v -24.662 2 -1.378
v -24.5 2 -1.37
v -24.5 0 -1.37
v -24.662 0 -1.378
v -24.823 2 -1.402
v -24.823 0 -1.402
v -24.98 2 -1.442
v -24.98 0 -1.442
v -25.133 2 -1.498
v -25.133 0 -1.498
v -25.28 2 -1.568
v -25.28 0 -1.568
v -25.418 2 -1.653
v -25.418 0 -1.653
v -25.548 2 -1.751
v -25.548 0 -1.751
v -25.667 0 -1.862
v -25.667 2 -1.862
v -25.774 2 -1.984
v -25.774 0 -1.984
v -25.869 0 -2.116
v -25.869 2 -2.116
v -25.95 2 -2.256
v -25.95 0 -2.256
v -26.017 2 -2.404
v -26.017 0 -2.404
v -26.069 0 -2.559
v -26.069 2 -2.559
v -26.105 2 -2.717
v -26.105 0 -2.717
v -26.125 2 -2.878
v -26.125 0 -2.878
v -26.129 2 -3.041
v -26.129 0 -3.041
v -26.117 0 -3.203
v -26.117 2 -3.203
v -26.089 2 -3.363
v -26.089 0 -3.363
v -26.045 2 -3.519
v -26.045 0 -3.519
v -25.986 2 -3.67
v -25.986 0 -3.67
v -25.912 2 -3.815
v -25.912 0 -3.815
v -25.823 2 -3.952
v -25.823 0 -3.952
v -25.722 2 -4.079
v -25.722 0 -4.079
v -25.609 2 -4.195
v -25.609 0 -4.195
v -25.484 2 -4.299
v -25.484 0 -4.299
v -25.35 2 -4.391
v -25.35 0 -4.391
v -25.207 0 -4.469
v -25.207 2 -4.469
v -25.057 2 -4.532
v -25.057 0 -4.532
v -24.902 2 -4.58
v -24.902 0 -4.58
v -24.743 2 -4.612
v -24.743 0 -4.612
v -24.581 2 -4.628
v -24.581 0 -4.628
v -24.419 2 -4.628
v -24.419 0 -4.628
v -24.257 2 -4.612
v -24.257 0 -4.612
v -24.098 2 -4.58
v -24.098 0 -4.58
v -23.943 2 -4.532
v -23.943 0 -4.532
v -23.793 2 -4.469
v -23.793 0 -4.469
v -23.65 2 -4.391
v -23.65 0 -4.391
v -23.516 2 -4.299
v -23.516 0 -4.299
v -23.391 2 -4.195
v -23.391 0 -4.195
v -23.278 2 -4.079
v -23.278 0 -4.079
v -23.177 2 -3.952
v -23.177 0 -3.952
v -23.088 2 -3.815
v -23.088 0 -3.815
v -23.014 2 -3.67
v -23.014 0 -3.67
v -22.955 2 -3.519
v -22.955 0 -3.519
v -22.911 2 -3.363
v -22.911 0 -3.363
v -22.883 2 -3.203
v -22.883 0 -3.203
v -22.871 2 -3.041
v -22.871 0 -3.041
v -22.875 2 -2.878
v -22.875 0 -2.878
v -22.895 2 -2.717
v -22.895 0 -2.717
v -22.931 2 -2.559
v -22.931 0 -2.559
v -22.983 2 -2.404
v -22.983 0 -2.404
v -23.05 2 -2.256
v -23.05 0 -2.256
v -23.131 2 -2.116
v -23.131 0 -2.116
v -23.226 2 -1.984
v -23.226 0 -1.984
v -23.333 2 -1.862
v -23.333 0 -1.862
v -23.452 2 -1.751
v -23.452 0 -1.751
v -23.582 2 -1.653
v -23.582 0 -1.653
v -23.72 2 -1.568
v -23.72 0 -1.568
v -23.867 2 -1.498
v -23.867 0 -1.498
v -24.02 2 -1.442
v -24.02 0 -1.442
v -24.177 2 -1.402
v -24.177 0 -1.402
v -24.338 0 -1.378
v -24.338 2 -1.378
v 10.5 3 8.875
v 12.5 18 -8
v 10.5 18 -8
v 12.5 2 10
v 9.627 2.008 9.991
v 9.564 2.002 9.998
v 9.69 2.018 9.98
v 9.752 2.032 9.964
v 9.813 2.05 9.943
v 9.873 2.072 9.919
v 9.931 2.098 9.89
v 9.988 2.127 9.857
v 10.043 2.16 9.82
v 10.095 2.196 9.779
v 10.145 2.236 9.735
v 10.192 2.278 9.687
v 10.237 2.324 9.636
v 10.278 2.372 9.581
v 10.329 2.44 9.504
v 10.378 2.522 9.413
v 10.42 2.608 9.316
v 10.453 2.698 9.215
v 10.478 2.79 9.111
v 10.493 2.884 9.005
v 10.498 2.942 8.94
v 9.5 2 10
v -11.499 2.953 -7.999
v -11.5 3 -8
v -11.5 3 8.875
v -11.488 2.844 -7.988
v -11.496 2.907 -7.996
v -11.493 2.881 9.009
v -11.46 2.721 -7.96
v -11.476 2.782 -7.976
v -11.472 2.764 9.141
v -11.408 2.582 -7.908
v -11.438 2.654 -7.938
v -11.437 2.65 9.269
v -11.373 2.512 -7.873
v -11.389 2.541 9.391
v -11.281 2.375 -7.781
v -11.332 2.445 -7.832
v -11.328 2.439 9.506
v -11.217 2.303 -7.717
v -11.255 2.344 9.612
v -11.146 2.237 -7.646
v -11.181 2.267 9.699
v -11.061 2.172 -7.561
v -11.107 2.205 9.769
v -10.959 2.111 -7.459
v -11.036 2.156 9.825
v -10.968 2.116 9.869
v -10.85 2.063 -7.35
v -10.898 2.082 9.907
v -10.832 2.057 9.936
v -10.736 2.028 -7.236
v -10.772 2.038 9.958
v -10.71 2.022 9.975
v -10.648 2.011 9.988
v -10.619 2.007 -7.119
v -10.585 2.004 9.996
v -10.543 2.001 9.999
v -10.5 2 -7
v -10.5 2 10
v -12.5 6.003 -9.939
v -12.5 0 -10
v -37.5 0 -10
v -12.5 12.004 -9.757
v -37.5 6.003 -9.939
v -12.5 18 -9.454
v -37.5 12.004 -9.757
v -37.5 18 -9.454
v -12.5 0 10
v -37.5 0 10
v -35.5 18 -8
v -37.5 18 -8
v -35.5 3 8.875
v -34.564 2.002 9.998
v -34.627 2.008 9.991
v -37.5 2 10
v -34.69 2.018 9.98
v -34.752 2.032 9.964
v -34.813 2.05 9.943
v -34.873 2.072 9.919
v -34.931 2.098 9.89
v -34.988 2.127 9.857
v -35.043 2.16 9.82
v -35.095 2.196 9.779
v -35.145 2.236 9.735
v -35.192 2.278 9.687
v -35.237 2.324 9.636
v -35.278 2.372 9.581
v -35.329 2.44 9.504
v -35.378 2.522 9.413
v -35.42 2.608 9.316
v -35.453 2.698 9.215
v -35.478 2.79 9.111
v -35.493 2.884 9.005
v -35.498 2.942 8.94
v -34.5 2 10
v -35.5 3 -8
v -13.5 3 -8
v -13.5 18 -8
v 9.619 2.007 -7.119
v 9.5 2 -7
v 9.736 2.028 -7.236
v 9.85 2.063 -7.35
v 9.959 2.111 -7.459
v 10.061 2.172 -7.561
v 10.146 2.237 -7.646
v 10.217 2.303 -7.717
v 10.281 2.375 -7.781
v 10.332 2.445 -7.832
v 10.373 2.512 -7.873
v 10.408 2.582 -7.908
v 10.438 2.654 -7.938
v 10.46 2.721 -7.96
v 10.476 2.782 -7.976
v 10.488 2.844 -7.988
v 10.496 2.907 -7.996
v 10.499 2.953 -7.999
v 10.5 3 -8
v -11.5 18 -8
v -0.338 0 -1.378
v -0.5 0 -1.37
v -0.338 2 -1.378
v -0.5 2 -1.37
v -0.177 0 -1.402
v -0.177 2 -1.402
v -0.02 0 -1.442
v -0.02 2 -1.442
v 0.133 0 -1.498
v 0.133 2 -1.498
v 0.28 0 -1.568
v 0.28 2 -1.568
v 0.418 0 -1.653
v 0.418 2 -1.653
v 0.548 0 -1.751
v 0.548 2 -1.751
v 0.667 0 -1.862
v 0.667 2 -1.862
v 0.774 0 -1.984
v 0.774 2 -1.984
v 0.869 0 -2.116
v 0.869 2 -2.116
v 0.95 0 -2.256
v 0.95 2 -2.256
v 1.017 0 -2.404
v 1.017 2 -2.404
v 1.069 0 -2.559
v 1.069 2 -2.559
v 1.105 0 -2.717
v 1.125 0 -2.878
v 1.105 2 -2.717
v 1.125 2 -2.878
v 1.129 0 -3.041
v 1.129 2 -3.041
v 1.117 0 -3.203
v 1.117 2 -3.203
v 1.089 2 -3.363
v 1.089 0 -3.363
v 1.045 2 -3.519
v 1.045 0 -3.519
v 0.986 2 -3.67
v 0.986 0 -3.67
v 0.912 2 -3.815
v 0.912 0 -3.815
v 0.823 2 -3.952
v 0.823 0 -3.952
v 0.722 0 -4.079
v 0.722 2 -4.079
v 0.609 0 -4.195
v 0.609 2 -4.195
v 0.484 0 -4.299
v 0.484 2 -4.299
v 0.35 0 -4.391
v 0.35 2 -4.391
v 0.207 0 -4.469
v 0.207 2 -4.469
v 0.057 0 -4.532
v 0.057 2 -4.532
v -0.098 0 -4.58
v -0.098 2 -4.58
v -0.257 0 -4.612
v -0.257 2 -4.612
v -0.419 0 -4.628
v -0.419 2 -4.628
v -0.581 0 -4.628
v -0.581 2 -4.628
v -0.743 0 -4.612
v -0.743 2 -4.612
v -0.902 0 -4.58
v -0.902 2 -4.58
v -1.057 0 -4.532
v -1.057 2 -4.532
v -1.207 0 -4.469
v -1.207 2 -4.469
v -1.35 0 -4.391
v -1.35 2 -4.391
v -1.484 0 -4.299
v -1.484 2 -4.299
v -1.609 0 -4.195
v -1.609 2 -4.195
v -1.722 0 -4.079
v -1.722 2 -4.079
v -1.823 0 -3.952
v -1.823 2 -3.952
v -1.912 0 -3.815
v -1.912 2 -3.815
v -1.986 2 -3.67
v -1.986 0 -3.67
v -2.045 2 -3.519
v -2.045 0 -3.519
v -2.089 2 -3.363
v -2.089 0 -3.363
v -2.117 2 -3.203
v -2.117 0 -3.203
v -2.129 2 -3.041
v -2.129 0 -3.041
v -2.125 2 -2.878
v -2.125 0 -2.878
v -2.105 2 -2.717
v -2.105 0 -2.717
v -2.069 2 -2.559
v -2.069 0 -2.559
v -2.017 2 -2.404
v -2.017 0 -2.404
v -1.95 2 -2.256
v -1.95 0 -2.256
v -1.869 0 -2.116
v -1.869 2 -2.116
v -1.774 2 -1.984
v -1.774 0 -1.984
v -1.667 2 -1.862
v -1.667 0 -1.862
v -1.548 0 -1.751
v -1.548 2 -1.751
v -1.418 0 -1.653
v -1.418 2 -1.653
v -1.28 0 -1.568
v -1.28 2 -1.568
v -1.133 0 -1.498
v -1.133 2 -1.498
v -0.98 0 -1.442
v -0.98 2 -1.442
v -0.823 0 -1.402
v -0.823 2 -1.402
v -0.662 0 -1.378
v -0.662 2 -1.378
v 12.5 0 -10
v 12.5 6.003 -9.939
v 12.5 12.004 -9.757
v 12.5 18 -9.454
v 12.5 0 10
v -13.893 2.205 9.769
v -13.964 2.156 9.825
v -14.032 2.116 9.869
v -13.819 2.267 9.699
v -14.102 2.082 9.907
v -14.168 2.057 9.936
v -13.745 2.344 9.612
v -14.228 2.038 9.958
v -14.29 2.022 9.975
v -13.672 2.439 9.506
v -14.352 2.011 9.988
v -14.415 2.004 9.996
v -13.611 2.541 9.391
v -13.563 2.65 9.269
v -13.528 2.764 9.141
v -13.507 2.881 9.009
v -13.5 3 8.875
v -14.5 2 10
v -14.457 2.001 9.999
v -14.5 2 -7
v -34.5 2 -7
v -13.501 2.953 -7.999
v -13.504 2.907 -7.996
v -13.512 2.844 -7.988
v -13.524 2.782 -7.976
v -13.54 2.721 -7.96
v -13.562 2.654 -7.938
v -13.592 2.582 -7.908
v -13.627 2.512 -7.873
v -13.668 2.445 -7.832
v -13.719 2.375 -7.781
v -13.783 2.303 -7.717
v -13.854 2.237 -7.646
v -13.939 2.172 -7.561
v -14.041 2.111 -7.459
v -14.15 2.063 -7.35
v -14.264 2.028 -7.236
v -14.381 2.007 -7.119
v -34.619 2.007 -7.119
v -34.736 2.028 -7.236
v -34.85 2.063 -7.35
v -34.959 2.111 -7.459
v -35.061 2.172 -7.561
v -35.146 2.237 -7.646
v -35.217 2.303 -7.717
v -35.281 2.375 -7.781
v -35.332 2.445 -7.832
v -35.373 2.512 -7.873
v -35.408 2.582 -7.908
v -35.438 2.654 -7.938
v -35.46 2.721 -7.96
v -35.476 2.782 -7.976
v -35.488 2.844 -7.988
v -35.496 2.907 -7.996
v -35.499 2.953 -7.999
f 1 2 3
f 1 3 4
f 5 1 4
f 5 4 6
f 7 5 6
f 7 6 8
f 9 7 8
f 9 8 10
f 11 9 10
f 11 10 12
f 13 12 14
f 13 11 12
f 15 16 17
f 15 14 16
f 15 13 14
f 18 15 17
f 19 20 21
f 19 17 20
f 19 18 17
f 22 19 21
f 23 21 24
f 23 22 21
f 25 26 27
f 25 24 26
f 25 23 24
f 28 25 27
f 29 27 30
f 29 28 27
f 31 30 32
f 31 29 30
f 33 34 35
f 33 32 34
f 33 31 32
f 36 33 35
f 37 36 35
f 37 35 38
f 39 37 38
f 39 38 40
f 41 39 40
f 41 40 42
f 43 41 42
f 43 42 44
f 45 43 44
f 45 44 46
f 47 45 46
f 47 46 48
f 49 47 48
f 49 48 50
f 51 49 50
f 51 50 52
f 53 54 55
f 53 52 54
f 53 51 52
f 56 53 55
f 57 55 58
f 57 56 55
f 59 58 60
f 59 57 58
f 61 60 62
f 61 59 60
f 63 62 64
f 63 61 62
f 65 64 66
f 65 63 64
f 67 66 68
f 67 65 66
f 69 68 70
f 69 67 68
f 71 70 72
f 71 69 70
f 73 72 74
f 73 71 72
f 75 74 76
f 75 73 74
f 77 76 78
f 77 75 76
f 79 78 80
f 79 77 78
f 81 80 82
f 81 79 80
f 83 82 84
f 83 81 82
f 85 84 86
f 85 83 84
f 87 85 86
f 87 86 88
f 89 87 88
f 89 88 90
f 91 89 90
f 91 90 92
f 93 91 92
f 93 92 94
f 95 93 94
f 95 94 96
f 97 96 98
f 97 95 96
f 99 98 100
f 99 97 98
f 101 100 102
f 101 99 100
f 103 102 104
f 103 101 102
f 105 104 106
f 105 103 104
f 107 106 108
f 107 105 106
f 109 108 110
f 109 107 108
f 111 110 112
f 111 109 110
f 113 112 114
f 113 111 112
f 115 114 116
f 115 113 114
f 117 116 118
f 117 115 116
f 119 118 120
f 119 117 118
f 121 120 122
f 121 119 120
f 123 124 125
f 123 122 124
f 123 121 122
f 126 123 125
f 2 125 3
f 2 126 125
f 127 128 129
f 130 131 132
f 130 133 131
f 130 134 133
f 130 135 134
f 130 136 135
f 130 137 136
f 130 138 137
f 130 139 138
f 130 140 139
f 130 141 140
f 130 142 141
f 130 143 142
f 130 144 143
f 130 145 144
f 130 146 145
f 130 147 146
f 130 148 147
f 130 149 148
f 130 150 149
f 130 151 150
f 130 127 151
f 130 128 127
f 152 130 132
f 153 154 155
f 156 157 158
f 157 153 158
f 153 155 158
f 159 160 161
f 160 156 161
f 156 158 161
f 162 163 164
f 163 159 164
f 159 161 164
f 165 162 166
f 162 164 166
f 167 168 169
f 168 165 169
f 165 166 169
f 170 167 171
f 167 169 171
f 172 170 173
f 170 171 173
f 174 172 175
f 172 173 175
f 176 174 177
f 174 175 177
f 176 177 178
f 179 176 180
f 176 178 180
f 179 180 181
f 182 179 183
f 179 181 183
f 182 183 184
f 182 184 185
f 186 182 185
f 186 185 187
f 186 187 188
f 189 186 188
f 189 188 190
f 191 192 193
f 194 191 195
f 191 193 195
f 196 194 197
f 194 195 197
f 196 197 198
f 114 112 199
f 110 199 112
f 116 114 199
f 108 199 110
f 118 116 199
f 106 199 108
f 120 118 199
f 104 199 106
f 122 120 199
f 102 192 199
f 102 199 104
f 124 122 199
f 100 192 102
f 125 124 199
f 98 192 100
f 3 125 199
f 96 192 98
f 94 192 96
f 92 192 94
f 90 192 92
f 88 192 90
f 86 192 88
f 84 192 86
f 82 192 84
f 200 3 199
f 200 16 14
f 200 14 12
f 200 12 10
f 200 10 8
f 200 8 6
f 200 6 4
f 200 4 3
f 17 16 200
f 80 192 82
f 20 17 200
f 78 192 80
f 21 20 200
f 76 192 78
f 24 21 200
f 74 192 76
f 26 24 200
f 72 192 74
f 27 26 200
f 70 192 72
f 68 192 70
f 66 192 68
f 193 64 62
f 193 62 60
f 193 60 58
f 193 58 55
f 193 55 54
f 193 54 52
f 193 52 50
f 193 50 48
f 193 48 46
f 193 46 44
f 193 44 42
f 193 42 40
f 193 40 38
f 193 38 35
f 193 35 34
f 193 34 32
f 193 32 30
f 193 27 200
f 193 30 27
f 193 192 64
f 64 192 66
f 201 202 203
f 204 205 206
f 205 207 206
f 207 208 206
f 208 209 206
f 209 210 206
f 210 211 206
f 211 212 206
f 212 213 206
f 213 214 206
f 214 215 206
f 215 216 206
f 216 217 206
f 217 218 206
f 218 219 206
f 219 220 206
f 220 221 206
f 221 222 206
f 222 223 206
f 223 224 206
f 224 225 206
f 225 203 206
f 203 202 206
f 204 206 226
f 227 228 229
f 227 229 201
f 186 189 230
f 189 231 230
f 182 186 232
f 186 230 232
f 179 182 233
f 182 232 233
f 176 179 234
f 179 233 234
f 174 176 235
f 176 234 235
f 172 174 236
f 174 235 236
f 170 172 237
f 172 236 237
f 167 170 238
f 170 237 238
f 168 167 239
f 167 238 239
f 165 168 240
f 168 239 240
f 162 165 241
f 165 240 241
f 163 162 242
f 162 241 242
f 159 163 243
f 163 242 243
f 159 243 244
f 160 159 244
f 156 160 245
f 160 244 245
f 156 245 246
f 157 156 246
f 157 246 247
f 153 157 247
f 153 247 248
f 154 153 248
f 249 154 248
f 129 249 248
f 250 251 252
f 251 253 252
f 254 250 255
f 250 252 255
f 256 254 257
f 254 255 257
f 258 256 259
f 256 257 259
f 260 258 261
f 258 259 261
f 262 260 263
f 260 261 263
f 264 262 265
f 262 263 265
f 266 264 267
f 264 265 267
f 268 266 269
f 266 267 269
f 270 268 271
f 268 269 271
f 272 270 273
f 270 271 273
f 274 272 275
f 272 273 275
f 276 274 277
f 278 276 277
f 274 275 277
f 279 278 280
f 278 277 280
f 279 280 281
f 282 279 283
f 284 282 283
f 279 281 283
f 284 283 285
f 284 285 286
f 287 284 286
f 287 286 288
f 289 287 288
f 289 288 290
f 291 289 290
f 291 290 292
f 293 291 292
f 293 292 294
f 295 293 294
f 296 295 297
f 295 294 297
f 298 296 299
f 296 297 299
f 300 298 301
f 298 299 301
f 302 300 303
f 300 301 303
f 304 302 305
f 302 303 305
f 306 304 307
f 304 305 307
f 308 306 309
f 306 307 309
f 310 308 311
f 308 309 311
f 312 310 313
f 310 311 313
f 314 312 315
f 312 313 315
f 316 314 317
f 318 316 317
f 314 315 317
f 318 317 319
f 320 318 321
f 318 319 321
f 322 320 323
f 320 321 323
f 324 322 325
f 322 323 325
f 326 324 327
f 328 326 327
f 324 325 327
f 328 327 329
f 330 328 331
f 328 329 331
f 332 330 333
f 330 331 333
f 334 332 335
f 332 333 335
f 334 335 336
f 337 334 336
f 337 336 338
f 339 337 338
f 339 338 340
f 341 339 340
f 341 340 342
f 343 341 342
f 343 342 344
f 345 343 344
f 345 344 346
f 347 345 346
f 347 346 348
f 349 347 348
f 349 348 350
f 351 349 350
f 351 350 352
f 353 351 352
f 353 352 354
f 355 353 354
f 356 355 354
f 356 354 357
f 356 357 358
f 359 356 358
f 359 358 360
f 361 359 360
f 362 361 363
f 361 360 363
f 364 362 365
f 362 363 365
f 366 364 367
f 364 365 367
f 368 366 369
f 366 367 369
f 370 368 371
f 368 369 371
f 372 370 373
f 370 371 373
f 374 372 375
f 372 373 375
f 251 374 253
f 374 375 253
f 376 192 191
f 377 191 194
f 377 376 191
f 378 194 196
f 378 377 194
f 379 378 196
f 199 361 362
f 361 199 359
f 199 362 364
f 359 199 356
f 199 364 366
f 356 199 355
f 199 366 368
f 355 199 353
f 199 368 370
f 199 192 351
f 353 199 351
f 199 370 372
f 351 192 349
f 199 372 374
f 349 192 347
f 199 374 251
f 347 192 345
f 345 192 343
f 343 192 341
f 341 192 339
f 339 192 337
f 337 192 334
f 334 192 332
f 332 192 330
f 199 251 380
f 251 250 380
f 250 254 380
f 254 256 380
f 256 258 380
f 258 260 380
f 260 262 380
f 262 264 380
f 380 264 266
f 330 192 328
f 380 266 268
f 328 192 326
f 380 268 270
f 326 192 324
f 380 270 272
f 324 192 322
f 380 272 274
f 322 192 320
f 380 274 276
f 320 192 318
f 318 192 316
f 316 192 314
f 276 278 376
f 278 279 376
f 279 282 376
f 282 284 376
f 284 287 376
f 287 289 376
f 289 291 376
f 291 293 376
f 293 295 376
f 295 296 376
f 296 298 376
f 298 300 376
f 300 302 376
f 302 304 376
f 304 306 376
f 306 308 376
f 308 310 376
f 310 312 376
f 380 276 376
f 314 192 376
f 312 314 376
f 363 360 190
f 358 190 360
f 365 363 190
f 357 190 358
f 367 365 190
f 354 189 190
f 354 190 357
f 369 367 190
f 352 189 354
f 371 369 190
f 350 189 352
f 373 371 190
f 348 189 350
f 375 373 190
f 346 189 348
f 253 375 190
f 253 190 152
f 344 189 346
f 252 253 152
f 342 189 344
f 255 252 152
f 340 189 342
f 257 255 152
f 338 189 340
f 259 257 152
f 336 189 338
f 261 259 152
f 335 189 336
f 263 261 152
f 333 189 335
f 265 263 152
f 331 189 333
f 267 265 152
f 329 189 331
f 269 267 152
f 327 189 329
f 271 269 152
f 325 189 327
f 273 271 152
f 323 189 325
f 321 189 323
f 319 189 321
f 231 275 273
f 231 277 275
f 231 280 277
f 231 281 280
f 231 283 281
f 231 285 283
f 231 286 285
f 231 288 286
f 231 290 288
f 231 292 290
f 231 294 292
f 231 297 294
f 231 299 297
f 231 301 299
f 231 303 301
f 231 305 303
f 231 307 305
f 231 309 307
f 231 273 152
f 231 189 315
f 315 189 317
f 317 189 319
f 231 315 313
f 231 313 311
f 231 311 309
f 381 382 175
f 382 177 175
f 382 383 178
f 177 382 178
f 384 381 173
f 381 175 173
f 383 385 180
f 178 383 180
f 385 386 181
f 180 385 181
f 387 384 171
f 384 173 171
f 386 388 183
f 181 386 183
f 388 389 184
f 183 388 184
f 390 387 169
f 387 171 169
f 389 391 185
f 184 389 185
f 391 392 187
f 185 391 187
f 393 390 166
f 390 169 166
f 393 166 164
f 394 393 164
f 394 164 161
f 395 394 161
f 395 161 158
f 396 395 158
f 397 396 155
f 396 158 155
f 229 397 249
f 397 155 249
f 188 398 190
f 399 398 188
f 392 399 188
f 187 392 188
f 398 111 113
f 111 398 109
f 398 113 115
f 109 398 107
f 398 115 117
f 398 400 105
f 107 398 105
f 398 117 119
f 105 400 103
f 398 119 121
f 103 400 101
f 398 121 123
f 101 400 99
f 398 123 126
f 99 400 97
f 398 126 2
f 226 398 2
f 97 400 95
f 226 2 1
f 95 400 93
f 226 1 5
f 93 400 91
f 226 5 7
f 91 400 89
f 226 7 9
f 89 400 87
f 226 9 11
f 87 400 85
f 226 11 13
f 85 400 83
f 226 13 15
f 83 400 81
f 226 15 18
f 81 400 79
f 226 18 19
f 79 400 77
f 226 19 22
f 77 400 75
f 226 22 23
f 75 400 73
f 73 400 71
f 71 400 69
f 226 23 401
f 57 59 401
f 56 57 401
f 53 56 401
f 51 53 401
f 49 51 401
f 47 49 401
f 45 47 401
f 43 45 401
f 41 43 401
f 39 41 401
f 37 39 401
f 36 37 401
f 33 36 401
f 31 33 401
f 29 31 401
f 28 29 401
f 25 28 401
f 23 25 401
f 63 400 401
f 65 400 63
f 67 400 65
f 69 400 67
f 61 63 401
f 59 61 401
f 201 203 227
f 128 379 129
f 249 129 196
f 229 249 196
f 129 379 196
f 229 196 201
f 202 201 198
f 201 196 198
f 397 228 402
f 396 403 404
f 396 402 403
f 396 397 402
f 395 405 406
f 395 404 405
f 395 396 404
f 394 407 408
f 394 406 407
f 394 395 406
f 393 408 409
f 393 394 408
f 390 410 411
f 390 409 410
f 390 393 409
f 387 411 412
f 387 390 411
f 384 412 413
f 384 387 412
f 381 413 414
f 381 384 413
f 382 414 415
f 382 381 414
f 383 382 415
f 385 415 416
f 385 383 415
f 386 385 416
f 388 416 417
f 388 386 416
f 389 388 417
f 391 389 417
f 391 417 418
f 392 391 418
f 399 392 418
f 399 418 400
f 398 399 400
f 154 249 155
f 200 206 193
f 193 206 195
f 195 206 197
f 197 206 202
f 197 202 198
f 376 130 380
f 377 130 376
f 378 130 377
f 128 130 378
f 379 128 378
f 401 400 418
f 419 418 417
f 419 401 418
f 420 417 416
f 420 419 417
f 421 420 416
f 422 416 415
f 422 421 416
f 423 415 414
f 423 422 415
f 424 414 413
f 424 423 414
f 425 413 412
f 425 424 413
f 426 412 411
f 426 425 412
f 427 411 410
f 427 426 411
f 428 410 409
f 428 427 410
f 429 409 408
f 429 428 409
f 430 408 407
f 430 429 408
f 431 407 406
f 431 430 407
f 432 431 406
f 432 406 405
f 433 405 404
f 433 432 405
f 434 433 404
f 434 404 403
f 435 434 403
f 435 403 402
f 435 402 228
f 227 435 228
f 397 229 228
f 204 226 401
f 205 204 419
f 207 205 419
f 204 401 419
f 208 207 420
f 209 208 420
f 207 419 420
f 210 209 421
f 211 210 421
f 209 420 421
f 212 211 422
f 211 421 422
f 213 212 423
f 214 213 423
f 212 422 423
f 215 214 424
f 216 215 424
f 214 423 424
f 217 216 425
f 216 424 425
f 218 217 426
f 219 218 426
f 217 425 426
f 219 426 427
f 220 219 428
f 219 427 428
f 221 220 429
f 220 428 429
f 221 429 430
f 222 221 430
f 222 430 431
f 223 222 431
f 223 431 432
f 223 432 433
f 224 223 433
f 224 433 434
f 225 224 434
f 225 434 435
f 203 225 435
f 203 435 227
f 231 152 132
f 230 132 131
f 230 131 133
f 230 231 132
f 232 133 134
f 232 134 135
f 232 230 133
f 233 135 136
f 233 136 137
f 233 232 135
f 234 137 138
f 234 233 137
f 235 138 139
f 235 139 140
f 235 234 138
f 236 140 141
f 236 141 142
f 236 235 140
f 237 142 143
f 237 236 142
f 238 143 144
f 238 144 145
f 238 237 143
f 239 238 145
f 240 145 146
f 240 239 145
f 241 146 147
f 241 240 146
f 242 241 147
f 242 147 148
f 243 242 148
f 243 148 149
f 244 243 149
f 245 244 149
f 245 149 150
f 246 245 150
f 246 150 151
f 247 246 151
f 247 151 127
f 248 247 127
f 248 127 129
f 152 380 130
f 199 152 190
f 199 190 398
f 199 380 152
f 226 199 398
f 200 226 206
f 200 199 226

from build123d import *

# Parameters (mm, degrees)
SKETCH5_W            = 25
SKETCH5_H            = 20
BOSS_EXTRUDE3_DEPTH  = 2
SKETCH6_W            = 25
SKETCH6_H            = 2
BOSS_EXTRUDE4_DEPTH  = 16
BOSS_EXTRUDE5_DEPTH  = 2
BOSS_EXTRUDE6_DEPTH  = 1
SKETCH9_R            = 1.63
CUT_EXTRUDE2_DEPTH   = 23.632940596
FILLET1_R            = 1
SKETCH10_R           = 307
SKETCH10_R_2         = 297
CUT_EXTRUDE3_DEPTH   = 33.388269481
FILLET1_OF_MIRROR3_R = 1


with BuildPart() as part:
    # Sketch5 → Boss-Extrude3 (new body)
    with BuildSketch(Plane(origin=(0, 0, 0), x_dir=(1, 0, 0), z_dir=(0, 1, 0))):
        Rectangle(SKETCH5_W, SKETCH5_H)
    boss_extrude3 = extrude(amount=BOSS_EXTRUDE3_DEPTH)

    # Sketch6 → Boss-Extrude4 (add)
    with BuildSketch(Plane(origin=(0, 2, 0), x_dir=(1, 0, 0), z_dir=(0, 1, 0))):
        with Locations((0, 9)):
            Rectangle(SKETCH6_W, SKETCH6_H)
    boss_extrude4 = extrude(amount=BOSS_EXTRUDE4_DEPTH)

    # Sketch7 → Boss-Extrude5 (add)
    with BuildSketch(Plane(origin=(12.5, 0, 0), x_dir=(0, 0, -1), z_dir=(1, 0, 0))):
        Polygon((8, 18), (-10, 2), (8, 2), align=None)
    boss_extrude5 = extrude(amount=-BOSS_EXTRUDE5_DEPTH)

    # Sketch8 → Boss-Extrude6 (add)
    with BuildSketch(Plane.ZY.offset(12.5)):
        Polygon((-8, 18), (-8, 2), (10, 2), align=None)
    boss_extrude6 = extrude(amount=-BOSS_EXTRUDE6_DEPTH)

    # Sketch9 → Cut-Extrude2 (cut, symmetric)
    with BuildSketch(Plane(origin=(0, 2, 0), x_dir=(1, 0, 0), z_dir=(0, 1, 0))):
        with Locations(Location((-0.5, 3, 0), (0, 0, 270))):
            Circle(SKETCH9_R)
    cut_extrude2 = extrude(amount=CUT_EXTRUDE2_DEPTH, both=True, mode=Mode.SUBTRACT)

    # Fillet1
    fillet1_edges = [part.edges().sort_by_distance(p)[0] for p in [
        (10.5, 2, 1),
        (-0.5, 2, -8),
        (-11.5, 2, 1),
    ]]
    fillet(fillet1_edges, radius=FILLET1_R)

    # Sketch10 → Cut-Extrude3 (cut, through all)
    with BuildSketch(Plane(origin=(12.5, 0, 0), x_dir=(0, 0, -1), z_dir=(1, 0, 0))):
        with Locations((-287, 0)):
            Circle(SKETCH10_R)
        with Locations((-287, 0)):
            Circle(SKETCH10_R_2, mode=Mode.SUBTRACT)
    cut_extrude3 = extrude(amount=-CUT_EXTRUDE3_DEPTH, mode=Mode.SUBTRACT)


with BuildPart() as mirror3_1:
    # Mirror3: Boss-Extrude3, Boss-Extrude4, Boss-Extrude5, Boss-Extrude6 across plane
    add(boss_extrude3.mirror(Plane(origin=(-12.5, 2, -10), x_dir=(0, 0, 1), z_dir=(1, 0, 0))))
    add(boss_extrude4.mirror(Plane(origin=(-12.5, 2, -10), x_dir=(0, 0, 1), z_dir=(1, 0, 0))))
    add(boss_extrude5.mirror(Plane(origin=(-12.5, 2, -10), x_dir=(0, 0, 1), z_dir=(1, 0, 0))))
    add(boss_extrude6.mirror(Plane(origin=(-12.5, 2, -10), x_dir=(0, 0, 1), z_dir=(1, 0, 0))))

    # Mirror3 2: Cut-Extrude2, Cut-Extrude3 across plane
    add(cut_extrude2.mirror(Plane(origin=(-12.5, 2, -10), x_dir=(0, 0, 1), z_dir=(1, 0, 0))), mode=Mode.SUBTRACT)
    add(cut_extrude3.mirror(Plane(origin=(-12.5, 2, -10), x_dir=(0, 0, 1), z_dir=(1, 0, 0))), mode=Mode.SUBTRACT)

    # Fillet1 of Mirror3
    fillet1_of_mirror3_edges = [mirror3_1.edges().sort_by_distance(p)[0] for p in [
        (-35.5, 2, 1),
        (-24.5, 2, -8),
        (-13.5, 2, 1),
    ]]
    fillet(fillet1_of_mirror3_edges, radius=FILLET1_OF_MIRROR3_R)


with BuildPart() as part_1:
    add(part.part)

    # Mirror3 united with what the copies touc: union Mirror3_1
    add(mirror3_1.part)


solid = part_1.part
